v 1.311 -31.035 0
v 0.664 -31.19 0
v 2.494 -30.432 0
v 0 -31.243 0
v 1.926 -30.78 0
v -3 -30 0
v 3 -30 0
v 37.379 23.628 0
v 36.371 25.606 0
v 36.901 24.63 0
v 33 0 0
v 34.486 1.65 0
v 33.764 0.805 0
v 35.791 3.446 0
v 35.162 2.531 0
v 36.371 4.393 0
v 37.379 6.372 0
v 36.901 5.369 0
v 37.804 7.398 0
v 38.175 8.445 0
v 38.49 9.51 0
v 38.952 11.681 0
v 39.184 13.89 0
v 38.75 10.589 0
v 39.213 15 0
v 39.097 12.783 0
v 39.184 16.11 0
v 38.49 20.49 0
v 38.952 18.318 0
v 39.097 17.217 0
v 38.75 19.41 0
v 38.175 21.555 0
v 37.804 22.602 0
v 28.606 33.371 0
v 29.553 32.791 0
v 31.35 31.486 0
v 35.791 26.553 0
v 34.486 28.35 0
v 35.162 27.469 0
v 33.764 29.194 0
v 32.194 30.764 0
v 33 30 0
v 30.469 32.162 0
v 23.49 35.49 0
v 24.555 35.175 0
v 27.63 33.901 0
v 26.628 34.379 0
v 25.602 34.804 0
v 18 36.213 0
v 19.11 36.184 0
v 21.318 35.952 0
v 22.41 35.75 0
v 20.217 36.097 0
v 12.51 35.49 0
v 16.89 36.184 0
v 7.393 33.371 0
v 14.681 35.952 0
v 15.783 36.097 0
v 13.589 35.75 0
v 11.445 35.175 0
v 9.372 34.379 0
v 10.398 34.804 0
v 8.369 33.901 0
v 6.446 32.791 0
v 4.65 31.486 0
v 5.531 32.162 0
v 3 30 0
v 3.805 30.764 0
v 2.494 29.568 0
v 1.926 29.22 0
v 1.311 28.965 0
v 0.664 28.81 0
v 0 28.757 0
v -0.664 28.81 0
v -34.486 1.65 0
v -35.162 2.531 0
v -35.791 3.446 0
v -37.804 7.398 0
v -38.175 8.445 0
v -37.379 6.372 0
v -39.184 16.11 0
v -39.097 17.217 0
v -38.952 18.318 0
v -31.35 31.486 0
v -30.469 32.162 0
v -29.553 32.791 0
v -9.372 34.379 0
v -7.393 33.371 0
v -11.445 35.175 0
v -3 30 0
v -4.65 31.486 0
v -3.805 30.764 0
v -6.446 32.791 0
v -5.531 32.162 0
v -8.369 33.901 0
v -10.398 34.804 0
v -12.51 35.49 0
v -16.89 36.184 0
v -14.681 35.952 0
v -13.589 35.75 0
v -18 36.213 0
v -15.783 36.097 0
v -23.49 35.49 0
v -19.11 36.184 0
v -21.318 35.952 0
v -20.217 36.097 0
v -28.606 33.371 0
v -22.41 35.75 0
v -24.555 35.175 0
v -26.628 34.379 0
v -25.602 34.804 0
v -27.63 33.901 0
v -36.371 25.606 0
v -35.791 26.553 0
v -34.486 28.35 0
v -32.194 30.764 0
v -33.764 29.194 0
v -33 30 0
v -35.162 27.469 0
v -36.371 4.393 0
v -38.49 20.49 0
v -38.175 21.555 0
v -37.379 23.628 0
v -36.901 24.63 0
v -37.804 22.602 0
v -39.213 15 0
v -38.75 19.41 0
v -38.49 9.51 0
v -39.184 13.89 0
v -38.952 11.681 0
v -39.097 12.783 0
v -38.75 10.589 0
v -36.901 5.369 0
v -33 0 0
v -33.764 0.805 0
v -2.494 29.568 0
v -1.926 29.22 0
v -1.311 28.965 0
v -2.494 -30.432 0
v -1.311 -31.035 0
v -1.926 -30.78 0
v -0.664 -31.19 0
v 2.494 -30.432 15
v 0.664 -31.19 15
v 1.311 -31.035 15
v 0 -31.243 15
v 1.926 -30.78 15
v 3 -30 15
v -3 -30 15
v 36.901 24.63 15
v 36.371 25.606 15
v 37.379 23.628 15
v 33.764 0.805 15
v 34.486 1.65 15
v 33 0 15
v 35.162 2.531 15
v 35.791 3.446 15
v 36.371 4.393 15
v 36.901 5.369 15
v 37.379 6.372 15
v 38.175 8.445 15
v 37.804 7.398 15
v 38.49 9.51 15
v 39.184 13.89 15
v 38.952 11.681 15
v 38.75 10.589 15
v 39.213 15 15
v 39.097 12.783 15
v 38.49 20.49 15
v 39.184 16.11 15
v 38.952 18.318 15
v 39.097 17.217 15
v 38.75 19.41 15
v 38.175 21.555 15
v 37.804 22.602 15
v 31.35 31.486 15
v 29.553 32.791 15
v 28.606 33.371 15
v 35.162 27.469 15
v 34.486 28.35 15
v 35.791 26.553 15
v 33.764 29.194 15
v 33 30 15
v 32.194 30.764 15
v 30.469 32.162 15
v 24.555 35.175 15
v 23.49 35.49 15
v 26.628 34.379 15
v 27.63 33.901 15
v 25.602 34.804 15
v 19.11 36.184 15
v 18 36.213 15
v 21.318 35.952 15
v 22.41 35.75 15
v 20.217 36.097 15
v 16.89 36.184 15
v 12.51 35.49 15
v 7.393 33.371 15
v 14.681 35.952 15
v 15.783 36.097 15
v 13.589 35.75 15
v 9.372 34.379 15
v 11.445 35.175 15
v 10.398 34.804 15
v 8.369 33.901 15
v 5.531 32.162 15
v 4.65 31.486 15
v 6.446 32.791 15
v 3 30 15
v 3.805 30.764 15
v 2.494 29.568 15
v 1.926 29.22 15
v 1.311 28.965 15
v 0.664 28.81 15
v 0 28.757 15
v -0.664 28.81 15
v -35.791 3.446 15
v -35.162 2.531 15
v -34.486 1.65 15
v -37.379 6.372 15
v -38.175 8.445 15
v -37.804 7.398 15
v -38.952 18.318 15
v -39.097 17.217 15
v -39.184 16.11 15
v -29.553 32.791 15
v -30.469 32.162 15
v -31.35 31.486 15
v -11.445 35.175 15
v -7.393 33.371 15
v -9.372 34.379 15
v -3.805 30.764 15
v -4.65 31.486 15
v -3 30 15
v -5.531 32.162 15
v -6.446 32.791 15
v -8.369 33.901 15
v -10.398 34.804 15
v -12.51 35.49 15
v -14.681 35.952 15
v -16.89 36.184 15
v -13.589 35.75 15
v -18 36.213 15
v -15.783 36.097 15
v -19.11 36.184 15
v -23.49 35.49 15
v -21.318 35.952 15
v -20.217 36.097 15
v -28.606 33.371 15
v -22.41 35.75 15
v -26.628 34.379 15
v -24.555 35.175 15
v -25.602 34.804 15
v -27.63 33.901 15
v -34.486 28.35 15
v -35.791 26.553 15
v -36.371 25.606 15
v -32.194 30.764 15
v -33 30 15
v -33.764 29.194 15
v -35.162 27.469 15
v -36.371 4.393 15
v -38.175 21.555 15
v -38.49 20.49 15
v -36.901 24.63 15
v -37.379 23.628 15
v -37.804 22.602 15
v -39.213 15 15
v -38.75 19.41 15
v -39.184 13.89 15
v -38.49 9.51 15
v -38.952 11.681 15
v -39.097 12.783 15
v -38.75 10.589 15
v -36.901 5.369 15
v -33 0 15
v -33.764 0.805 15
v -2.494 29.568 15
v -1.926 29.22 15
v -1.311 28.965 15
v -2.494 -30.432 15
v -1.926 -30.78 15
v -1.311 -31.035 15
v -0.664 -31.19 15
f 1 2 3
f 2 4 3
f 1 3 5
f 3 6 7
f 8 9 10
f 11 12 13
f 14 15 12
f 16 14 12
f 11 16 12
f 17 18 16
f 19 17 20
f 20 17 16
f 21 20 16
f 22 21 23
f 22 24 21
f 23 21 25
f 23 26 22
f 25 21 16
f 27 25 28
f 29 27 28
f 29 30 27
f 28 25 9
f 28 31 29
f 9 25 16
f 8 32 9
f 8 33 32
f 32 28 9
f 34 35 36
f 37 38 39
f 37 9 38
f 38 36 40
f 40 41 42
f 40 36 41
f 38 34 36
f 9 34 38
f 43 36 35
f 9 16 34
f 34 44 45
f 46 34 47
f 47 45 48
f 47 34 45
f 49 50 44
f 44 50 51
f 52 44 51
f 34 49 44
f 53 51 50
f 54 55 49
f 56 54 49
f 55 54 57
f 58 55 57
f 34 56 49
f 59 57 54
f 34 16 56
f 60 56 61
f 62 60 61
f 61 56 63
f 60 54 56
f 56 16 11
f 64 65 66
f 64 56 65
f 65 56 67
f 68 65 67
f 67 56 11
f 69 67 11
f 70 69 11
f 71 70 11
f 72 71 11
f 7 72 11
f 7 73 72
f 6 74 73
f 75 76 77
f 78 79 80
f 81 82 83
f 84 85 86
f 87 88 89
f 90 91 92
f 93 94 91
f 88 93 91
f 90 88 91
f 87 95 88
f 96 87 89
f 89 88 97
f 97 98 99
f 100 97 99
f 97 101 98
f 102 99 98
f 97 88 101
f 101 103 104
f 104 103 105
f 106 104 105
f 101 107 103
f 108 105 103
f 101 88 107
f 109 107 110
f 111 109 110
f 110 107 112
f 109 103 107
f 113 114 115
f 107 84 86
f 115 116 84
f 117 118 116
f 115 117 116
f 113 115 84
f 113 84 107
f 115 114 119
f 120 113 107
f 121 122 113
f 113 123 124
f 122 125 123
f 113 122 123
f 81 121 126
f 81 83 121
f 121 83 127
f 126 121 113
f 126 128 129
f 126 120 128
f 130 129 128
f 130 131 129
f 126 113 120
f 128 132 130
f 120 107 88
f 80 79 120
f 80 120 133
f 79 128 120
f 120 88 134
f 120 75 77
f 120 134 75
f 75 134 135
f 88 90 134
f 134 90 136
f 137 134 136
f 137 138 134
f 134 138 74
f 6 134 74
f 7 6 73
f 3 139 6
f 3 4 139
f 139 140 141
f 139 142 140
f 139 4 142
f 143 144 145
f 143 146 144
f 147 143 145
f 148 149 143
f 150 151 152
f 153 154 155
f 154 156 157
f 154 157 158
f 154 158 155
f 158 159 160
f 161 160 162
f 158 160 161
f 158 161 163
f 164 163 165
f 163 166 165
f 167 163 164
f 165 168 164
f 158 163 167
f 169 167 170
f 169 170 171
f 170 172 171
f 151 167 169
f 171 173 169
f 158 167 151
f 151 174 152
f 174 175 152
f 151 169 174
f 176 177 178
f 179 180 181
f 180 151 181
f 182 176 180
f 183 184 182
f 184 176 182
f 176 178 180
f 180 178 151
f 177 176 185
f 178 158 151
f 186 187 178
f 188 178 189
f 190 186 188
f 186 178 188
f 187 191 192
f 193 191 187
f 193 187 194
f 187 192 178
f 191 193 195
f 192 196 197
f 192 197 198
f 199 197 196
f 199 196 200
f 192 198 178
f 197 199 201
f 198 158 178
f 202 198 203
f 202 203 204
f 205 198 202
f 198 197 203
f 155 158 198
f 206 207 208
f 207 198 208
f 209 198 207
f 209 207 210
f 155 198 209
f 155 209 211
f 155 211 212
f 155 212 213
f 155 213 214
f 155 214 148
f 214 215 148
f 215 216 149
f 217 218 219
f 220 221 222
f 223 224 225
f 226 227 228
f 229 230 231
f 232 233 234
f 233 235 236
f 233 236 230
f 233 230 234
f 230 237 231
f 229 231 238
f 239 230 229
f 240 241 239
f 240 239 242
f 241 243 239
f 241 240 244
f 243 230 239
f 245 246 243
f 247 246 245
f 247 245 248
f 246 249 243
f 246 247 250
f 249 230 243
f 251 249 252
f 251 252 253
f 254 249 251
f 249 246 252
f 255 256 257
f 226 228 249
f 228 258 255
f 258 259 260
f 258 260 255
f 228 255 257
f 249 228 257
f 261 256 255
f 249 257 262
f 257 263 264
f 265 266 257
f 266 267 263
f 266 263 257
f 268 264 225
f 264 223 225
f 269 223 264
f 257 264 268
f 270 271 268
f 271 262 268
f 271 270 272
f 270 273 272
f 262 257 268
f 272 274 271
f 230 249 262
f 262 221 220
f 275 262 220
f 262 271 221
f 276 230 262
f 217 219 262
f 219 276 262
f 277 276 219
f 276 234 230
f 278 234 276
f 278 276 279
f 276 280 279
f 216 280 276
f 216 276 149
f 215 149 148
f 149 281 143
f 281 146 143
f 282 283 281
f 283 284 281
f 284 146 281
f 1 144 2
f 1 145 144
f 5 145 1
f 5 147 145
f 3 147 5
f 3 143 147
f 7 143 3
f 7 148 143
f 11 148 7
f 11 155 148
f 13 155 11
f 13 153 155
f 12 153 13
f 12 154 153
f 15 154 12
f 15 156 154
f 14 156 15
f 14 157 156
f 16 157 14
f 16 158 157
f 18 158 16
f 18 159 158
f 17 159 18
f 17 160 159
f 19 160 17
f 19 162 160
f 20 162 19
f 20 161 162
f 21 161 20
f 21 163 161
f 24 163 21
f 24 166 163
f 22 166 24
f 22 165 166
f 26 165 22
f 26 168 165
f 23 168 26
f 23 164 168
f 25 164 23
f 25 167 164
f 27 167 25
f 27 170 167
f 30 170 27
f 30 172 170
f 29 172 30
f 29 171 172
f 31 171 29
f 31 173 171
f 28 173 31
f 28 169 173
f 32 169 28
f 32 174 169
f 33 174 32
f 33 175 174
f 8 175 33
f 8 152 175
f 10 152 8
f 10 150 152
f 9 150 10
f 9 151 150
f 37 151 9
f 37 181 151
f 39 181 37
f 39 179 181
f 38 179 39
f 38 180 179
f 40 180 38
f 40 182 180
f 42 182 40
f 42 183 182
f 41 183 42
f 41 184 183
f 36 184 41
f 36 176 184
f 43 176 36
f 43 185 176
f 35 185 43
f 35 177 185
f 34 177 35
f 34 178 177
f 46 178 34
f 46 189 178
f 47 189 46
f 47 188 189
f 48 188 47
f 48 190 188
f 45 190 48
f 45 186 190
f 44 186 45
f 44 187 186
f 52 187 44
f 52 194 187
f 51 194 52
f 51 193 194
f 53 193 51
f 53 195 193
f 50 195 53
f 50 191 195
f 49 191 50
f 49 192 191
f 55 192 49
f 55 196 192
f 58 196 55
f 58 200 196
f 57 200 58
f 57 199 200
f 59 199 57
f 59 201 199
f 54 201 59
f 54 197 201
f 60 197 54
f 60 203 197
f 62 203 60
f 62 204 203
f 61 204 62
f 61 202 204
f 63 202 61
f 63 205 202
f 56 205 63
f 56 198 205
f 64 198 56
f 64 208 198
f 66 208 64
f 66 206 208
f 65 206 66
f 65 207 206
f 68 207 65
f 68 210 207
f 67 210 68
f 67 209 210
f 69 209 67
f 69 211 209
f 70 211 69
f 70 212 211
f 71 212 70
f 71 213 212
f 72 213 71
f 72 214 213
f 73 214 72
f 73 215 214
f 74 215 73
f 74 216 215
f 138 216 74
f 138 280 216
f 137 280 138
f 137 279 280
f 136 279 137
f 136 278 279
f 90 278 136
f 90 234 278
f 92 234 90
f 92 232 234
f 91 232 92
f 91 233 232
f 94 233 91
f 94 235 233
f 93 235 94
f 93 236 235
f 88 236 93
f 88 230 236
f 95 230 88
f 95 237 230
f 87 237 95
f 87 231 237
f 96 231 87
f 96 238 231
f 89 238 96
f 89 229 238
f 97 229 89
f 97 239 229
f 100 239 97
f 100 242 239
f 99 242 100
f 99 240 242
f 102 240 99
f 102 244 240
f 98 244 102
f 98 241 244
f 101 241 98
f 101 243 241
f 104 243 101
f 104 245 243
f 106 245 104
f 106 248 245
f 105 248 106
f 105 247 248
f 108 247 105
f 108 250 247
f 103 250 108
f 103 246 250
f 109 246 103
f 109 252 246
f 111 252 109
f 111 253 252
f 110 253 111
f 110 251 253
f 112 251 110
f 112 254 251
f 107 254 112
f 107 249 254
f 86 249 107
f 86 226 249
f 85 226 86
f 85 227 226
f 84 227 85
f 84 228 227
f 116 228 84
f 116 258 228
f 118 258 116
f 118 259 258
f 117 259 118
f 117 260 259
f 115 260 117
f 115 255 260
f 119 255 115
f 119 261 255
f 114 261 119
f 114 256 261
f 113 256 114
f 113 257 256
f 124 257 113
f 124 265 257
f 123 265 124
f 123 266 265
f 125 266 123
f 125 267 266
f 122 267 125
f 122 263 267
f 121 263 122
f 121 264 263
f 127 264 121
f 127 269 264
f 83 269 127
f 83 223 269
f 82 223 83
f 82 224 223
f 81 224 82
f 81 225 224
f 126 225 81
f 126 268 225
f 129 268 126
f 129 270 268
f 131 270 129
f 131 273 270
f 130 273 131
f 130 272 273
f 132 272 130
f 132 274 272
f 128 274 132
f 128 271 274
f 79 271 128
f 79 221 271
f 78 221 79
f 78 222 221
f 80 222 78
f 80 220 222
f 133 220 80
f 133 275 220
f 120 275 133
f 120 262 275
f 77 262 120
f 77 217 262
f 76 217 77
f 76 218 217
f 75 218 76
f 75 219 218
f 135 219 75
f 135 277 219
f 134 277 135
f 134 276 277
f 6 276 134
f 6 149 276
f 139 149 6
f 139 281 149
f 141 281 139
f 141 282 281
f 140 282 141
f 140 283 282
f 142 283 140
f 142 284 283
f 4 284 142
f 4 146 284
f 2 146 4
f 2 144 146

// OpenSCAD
module template()union(){translate([2,0,0])scale(10){translate([1,1,0])circle(sqrt(2),$fn=120);polygon([[0,2],[2,0],[0,-2],[0,2]]);}}
module template2()difference(){union(){template();mirror()template();square([4,40],center=true);translate([0,-20+2,0])circle(2*sqrt(2),$fn=40);}translate([0,20+2,0])circle(2*sqrt(2),$fn=40);}
linear_extrude(height=15)scale(1.5)template2();
